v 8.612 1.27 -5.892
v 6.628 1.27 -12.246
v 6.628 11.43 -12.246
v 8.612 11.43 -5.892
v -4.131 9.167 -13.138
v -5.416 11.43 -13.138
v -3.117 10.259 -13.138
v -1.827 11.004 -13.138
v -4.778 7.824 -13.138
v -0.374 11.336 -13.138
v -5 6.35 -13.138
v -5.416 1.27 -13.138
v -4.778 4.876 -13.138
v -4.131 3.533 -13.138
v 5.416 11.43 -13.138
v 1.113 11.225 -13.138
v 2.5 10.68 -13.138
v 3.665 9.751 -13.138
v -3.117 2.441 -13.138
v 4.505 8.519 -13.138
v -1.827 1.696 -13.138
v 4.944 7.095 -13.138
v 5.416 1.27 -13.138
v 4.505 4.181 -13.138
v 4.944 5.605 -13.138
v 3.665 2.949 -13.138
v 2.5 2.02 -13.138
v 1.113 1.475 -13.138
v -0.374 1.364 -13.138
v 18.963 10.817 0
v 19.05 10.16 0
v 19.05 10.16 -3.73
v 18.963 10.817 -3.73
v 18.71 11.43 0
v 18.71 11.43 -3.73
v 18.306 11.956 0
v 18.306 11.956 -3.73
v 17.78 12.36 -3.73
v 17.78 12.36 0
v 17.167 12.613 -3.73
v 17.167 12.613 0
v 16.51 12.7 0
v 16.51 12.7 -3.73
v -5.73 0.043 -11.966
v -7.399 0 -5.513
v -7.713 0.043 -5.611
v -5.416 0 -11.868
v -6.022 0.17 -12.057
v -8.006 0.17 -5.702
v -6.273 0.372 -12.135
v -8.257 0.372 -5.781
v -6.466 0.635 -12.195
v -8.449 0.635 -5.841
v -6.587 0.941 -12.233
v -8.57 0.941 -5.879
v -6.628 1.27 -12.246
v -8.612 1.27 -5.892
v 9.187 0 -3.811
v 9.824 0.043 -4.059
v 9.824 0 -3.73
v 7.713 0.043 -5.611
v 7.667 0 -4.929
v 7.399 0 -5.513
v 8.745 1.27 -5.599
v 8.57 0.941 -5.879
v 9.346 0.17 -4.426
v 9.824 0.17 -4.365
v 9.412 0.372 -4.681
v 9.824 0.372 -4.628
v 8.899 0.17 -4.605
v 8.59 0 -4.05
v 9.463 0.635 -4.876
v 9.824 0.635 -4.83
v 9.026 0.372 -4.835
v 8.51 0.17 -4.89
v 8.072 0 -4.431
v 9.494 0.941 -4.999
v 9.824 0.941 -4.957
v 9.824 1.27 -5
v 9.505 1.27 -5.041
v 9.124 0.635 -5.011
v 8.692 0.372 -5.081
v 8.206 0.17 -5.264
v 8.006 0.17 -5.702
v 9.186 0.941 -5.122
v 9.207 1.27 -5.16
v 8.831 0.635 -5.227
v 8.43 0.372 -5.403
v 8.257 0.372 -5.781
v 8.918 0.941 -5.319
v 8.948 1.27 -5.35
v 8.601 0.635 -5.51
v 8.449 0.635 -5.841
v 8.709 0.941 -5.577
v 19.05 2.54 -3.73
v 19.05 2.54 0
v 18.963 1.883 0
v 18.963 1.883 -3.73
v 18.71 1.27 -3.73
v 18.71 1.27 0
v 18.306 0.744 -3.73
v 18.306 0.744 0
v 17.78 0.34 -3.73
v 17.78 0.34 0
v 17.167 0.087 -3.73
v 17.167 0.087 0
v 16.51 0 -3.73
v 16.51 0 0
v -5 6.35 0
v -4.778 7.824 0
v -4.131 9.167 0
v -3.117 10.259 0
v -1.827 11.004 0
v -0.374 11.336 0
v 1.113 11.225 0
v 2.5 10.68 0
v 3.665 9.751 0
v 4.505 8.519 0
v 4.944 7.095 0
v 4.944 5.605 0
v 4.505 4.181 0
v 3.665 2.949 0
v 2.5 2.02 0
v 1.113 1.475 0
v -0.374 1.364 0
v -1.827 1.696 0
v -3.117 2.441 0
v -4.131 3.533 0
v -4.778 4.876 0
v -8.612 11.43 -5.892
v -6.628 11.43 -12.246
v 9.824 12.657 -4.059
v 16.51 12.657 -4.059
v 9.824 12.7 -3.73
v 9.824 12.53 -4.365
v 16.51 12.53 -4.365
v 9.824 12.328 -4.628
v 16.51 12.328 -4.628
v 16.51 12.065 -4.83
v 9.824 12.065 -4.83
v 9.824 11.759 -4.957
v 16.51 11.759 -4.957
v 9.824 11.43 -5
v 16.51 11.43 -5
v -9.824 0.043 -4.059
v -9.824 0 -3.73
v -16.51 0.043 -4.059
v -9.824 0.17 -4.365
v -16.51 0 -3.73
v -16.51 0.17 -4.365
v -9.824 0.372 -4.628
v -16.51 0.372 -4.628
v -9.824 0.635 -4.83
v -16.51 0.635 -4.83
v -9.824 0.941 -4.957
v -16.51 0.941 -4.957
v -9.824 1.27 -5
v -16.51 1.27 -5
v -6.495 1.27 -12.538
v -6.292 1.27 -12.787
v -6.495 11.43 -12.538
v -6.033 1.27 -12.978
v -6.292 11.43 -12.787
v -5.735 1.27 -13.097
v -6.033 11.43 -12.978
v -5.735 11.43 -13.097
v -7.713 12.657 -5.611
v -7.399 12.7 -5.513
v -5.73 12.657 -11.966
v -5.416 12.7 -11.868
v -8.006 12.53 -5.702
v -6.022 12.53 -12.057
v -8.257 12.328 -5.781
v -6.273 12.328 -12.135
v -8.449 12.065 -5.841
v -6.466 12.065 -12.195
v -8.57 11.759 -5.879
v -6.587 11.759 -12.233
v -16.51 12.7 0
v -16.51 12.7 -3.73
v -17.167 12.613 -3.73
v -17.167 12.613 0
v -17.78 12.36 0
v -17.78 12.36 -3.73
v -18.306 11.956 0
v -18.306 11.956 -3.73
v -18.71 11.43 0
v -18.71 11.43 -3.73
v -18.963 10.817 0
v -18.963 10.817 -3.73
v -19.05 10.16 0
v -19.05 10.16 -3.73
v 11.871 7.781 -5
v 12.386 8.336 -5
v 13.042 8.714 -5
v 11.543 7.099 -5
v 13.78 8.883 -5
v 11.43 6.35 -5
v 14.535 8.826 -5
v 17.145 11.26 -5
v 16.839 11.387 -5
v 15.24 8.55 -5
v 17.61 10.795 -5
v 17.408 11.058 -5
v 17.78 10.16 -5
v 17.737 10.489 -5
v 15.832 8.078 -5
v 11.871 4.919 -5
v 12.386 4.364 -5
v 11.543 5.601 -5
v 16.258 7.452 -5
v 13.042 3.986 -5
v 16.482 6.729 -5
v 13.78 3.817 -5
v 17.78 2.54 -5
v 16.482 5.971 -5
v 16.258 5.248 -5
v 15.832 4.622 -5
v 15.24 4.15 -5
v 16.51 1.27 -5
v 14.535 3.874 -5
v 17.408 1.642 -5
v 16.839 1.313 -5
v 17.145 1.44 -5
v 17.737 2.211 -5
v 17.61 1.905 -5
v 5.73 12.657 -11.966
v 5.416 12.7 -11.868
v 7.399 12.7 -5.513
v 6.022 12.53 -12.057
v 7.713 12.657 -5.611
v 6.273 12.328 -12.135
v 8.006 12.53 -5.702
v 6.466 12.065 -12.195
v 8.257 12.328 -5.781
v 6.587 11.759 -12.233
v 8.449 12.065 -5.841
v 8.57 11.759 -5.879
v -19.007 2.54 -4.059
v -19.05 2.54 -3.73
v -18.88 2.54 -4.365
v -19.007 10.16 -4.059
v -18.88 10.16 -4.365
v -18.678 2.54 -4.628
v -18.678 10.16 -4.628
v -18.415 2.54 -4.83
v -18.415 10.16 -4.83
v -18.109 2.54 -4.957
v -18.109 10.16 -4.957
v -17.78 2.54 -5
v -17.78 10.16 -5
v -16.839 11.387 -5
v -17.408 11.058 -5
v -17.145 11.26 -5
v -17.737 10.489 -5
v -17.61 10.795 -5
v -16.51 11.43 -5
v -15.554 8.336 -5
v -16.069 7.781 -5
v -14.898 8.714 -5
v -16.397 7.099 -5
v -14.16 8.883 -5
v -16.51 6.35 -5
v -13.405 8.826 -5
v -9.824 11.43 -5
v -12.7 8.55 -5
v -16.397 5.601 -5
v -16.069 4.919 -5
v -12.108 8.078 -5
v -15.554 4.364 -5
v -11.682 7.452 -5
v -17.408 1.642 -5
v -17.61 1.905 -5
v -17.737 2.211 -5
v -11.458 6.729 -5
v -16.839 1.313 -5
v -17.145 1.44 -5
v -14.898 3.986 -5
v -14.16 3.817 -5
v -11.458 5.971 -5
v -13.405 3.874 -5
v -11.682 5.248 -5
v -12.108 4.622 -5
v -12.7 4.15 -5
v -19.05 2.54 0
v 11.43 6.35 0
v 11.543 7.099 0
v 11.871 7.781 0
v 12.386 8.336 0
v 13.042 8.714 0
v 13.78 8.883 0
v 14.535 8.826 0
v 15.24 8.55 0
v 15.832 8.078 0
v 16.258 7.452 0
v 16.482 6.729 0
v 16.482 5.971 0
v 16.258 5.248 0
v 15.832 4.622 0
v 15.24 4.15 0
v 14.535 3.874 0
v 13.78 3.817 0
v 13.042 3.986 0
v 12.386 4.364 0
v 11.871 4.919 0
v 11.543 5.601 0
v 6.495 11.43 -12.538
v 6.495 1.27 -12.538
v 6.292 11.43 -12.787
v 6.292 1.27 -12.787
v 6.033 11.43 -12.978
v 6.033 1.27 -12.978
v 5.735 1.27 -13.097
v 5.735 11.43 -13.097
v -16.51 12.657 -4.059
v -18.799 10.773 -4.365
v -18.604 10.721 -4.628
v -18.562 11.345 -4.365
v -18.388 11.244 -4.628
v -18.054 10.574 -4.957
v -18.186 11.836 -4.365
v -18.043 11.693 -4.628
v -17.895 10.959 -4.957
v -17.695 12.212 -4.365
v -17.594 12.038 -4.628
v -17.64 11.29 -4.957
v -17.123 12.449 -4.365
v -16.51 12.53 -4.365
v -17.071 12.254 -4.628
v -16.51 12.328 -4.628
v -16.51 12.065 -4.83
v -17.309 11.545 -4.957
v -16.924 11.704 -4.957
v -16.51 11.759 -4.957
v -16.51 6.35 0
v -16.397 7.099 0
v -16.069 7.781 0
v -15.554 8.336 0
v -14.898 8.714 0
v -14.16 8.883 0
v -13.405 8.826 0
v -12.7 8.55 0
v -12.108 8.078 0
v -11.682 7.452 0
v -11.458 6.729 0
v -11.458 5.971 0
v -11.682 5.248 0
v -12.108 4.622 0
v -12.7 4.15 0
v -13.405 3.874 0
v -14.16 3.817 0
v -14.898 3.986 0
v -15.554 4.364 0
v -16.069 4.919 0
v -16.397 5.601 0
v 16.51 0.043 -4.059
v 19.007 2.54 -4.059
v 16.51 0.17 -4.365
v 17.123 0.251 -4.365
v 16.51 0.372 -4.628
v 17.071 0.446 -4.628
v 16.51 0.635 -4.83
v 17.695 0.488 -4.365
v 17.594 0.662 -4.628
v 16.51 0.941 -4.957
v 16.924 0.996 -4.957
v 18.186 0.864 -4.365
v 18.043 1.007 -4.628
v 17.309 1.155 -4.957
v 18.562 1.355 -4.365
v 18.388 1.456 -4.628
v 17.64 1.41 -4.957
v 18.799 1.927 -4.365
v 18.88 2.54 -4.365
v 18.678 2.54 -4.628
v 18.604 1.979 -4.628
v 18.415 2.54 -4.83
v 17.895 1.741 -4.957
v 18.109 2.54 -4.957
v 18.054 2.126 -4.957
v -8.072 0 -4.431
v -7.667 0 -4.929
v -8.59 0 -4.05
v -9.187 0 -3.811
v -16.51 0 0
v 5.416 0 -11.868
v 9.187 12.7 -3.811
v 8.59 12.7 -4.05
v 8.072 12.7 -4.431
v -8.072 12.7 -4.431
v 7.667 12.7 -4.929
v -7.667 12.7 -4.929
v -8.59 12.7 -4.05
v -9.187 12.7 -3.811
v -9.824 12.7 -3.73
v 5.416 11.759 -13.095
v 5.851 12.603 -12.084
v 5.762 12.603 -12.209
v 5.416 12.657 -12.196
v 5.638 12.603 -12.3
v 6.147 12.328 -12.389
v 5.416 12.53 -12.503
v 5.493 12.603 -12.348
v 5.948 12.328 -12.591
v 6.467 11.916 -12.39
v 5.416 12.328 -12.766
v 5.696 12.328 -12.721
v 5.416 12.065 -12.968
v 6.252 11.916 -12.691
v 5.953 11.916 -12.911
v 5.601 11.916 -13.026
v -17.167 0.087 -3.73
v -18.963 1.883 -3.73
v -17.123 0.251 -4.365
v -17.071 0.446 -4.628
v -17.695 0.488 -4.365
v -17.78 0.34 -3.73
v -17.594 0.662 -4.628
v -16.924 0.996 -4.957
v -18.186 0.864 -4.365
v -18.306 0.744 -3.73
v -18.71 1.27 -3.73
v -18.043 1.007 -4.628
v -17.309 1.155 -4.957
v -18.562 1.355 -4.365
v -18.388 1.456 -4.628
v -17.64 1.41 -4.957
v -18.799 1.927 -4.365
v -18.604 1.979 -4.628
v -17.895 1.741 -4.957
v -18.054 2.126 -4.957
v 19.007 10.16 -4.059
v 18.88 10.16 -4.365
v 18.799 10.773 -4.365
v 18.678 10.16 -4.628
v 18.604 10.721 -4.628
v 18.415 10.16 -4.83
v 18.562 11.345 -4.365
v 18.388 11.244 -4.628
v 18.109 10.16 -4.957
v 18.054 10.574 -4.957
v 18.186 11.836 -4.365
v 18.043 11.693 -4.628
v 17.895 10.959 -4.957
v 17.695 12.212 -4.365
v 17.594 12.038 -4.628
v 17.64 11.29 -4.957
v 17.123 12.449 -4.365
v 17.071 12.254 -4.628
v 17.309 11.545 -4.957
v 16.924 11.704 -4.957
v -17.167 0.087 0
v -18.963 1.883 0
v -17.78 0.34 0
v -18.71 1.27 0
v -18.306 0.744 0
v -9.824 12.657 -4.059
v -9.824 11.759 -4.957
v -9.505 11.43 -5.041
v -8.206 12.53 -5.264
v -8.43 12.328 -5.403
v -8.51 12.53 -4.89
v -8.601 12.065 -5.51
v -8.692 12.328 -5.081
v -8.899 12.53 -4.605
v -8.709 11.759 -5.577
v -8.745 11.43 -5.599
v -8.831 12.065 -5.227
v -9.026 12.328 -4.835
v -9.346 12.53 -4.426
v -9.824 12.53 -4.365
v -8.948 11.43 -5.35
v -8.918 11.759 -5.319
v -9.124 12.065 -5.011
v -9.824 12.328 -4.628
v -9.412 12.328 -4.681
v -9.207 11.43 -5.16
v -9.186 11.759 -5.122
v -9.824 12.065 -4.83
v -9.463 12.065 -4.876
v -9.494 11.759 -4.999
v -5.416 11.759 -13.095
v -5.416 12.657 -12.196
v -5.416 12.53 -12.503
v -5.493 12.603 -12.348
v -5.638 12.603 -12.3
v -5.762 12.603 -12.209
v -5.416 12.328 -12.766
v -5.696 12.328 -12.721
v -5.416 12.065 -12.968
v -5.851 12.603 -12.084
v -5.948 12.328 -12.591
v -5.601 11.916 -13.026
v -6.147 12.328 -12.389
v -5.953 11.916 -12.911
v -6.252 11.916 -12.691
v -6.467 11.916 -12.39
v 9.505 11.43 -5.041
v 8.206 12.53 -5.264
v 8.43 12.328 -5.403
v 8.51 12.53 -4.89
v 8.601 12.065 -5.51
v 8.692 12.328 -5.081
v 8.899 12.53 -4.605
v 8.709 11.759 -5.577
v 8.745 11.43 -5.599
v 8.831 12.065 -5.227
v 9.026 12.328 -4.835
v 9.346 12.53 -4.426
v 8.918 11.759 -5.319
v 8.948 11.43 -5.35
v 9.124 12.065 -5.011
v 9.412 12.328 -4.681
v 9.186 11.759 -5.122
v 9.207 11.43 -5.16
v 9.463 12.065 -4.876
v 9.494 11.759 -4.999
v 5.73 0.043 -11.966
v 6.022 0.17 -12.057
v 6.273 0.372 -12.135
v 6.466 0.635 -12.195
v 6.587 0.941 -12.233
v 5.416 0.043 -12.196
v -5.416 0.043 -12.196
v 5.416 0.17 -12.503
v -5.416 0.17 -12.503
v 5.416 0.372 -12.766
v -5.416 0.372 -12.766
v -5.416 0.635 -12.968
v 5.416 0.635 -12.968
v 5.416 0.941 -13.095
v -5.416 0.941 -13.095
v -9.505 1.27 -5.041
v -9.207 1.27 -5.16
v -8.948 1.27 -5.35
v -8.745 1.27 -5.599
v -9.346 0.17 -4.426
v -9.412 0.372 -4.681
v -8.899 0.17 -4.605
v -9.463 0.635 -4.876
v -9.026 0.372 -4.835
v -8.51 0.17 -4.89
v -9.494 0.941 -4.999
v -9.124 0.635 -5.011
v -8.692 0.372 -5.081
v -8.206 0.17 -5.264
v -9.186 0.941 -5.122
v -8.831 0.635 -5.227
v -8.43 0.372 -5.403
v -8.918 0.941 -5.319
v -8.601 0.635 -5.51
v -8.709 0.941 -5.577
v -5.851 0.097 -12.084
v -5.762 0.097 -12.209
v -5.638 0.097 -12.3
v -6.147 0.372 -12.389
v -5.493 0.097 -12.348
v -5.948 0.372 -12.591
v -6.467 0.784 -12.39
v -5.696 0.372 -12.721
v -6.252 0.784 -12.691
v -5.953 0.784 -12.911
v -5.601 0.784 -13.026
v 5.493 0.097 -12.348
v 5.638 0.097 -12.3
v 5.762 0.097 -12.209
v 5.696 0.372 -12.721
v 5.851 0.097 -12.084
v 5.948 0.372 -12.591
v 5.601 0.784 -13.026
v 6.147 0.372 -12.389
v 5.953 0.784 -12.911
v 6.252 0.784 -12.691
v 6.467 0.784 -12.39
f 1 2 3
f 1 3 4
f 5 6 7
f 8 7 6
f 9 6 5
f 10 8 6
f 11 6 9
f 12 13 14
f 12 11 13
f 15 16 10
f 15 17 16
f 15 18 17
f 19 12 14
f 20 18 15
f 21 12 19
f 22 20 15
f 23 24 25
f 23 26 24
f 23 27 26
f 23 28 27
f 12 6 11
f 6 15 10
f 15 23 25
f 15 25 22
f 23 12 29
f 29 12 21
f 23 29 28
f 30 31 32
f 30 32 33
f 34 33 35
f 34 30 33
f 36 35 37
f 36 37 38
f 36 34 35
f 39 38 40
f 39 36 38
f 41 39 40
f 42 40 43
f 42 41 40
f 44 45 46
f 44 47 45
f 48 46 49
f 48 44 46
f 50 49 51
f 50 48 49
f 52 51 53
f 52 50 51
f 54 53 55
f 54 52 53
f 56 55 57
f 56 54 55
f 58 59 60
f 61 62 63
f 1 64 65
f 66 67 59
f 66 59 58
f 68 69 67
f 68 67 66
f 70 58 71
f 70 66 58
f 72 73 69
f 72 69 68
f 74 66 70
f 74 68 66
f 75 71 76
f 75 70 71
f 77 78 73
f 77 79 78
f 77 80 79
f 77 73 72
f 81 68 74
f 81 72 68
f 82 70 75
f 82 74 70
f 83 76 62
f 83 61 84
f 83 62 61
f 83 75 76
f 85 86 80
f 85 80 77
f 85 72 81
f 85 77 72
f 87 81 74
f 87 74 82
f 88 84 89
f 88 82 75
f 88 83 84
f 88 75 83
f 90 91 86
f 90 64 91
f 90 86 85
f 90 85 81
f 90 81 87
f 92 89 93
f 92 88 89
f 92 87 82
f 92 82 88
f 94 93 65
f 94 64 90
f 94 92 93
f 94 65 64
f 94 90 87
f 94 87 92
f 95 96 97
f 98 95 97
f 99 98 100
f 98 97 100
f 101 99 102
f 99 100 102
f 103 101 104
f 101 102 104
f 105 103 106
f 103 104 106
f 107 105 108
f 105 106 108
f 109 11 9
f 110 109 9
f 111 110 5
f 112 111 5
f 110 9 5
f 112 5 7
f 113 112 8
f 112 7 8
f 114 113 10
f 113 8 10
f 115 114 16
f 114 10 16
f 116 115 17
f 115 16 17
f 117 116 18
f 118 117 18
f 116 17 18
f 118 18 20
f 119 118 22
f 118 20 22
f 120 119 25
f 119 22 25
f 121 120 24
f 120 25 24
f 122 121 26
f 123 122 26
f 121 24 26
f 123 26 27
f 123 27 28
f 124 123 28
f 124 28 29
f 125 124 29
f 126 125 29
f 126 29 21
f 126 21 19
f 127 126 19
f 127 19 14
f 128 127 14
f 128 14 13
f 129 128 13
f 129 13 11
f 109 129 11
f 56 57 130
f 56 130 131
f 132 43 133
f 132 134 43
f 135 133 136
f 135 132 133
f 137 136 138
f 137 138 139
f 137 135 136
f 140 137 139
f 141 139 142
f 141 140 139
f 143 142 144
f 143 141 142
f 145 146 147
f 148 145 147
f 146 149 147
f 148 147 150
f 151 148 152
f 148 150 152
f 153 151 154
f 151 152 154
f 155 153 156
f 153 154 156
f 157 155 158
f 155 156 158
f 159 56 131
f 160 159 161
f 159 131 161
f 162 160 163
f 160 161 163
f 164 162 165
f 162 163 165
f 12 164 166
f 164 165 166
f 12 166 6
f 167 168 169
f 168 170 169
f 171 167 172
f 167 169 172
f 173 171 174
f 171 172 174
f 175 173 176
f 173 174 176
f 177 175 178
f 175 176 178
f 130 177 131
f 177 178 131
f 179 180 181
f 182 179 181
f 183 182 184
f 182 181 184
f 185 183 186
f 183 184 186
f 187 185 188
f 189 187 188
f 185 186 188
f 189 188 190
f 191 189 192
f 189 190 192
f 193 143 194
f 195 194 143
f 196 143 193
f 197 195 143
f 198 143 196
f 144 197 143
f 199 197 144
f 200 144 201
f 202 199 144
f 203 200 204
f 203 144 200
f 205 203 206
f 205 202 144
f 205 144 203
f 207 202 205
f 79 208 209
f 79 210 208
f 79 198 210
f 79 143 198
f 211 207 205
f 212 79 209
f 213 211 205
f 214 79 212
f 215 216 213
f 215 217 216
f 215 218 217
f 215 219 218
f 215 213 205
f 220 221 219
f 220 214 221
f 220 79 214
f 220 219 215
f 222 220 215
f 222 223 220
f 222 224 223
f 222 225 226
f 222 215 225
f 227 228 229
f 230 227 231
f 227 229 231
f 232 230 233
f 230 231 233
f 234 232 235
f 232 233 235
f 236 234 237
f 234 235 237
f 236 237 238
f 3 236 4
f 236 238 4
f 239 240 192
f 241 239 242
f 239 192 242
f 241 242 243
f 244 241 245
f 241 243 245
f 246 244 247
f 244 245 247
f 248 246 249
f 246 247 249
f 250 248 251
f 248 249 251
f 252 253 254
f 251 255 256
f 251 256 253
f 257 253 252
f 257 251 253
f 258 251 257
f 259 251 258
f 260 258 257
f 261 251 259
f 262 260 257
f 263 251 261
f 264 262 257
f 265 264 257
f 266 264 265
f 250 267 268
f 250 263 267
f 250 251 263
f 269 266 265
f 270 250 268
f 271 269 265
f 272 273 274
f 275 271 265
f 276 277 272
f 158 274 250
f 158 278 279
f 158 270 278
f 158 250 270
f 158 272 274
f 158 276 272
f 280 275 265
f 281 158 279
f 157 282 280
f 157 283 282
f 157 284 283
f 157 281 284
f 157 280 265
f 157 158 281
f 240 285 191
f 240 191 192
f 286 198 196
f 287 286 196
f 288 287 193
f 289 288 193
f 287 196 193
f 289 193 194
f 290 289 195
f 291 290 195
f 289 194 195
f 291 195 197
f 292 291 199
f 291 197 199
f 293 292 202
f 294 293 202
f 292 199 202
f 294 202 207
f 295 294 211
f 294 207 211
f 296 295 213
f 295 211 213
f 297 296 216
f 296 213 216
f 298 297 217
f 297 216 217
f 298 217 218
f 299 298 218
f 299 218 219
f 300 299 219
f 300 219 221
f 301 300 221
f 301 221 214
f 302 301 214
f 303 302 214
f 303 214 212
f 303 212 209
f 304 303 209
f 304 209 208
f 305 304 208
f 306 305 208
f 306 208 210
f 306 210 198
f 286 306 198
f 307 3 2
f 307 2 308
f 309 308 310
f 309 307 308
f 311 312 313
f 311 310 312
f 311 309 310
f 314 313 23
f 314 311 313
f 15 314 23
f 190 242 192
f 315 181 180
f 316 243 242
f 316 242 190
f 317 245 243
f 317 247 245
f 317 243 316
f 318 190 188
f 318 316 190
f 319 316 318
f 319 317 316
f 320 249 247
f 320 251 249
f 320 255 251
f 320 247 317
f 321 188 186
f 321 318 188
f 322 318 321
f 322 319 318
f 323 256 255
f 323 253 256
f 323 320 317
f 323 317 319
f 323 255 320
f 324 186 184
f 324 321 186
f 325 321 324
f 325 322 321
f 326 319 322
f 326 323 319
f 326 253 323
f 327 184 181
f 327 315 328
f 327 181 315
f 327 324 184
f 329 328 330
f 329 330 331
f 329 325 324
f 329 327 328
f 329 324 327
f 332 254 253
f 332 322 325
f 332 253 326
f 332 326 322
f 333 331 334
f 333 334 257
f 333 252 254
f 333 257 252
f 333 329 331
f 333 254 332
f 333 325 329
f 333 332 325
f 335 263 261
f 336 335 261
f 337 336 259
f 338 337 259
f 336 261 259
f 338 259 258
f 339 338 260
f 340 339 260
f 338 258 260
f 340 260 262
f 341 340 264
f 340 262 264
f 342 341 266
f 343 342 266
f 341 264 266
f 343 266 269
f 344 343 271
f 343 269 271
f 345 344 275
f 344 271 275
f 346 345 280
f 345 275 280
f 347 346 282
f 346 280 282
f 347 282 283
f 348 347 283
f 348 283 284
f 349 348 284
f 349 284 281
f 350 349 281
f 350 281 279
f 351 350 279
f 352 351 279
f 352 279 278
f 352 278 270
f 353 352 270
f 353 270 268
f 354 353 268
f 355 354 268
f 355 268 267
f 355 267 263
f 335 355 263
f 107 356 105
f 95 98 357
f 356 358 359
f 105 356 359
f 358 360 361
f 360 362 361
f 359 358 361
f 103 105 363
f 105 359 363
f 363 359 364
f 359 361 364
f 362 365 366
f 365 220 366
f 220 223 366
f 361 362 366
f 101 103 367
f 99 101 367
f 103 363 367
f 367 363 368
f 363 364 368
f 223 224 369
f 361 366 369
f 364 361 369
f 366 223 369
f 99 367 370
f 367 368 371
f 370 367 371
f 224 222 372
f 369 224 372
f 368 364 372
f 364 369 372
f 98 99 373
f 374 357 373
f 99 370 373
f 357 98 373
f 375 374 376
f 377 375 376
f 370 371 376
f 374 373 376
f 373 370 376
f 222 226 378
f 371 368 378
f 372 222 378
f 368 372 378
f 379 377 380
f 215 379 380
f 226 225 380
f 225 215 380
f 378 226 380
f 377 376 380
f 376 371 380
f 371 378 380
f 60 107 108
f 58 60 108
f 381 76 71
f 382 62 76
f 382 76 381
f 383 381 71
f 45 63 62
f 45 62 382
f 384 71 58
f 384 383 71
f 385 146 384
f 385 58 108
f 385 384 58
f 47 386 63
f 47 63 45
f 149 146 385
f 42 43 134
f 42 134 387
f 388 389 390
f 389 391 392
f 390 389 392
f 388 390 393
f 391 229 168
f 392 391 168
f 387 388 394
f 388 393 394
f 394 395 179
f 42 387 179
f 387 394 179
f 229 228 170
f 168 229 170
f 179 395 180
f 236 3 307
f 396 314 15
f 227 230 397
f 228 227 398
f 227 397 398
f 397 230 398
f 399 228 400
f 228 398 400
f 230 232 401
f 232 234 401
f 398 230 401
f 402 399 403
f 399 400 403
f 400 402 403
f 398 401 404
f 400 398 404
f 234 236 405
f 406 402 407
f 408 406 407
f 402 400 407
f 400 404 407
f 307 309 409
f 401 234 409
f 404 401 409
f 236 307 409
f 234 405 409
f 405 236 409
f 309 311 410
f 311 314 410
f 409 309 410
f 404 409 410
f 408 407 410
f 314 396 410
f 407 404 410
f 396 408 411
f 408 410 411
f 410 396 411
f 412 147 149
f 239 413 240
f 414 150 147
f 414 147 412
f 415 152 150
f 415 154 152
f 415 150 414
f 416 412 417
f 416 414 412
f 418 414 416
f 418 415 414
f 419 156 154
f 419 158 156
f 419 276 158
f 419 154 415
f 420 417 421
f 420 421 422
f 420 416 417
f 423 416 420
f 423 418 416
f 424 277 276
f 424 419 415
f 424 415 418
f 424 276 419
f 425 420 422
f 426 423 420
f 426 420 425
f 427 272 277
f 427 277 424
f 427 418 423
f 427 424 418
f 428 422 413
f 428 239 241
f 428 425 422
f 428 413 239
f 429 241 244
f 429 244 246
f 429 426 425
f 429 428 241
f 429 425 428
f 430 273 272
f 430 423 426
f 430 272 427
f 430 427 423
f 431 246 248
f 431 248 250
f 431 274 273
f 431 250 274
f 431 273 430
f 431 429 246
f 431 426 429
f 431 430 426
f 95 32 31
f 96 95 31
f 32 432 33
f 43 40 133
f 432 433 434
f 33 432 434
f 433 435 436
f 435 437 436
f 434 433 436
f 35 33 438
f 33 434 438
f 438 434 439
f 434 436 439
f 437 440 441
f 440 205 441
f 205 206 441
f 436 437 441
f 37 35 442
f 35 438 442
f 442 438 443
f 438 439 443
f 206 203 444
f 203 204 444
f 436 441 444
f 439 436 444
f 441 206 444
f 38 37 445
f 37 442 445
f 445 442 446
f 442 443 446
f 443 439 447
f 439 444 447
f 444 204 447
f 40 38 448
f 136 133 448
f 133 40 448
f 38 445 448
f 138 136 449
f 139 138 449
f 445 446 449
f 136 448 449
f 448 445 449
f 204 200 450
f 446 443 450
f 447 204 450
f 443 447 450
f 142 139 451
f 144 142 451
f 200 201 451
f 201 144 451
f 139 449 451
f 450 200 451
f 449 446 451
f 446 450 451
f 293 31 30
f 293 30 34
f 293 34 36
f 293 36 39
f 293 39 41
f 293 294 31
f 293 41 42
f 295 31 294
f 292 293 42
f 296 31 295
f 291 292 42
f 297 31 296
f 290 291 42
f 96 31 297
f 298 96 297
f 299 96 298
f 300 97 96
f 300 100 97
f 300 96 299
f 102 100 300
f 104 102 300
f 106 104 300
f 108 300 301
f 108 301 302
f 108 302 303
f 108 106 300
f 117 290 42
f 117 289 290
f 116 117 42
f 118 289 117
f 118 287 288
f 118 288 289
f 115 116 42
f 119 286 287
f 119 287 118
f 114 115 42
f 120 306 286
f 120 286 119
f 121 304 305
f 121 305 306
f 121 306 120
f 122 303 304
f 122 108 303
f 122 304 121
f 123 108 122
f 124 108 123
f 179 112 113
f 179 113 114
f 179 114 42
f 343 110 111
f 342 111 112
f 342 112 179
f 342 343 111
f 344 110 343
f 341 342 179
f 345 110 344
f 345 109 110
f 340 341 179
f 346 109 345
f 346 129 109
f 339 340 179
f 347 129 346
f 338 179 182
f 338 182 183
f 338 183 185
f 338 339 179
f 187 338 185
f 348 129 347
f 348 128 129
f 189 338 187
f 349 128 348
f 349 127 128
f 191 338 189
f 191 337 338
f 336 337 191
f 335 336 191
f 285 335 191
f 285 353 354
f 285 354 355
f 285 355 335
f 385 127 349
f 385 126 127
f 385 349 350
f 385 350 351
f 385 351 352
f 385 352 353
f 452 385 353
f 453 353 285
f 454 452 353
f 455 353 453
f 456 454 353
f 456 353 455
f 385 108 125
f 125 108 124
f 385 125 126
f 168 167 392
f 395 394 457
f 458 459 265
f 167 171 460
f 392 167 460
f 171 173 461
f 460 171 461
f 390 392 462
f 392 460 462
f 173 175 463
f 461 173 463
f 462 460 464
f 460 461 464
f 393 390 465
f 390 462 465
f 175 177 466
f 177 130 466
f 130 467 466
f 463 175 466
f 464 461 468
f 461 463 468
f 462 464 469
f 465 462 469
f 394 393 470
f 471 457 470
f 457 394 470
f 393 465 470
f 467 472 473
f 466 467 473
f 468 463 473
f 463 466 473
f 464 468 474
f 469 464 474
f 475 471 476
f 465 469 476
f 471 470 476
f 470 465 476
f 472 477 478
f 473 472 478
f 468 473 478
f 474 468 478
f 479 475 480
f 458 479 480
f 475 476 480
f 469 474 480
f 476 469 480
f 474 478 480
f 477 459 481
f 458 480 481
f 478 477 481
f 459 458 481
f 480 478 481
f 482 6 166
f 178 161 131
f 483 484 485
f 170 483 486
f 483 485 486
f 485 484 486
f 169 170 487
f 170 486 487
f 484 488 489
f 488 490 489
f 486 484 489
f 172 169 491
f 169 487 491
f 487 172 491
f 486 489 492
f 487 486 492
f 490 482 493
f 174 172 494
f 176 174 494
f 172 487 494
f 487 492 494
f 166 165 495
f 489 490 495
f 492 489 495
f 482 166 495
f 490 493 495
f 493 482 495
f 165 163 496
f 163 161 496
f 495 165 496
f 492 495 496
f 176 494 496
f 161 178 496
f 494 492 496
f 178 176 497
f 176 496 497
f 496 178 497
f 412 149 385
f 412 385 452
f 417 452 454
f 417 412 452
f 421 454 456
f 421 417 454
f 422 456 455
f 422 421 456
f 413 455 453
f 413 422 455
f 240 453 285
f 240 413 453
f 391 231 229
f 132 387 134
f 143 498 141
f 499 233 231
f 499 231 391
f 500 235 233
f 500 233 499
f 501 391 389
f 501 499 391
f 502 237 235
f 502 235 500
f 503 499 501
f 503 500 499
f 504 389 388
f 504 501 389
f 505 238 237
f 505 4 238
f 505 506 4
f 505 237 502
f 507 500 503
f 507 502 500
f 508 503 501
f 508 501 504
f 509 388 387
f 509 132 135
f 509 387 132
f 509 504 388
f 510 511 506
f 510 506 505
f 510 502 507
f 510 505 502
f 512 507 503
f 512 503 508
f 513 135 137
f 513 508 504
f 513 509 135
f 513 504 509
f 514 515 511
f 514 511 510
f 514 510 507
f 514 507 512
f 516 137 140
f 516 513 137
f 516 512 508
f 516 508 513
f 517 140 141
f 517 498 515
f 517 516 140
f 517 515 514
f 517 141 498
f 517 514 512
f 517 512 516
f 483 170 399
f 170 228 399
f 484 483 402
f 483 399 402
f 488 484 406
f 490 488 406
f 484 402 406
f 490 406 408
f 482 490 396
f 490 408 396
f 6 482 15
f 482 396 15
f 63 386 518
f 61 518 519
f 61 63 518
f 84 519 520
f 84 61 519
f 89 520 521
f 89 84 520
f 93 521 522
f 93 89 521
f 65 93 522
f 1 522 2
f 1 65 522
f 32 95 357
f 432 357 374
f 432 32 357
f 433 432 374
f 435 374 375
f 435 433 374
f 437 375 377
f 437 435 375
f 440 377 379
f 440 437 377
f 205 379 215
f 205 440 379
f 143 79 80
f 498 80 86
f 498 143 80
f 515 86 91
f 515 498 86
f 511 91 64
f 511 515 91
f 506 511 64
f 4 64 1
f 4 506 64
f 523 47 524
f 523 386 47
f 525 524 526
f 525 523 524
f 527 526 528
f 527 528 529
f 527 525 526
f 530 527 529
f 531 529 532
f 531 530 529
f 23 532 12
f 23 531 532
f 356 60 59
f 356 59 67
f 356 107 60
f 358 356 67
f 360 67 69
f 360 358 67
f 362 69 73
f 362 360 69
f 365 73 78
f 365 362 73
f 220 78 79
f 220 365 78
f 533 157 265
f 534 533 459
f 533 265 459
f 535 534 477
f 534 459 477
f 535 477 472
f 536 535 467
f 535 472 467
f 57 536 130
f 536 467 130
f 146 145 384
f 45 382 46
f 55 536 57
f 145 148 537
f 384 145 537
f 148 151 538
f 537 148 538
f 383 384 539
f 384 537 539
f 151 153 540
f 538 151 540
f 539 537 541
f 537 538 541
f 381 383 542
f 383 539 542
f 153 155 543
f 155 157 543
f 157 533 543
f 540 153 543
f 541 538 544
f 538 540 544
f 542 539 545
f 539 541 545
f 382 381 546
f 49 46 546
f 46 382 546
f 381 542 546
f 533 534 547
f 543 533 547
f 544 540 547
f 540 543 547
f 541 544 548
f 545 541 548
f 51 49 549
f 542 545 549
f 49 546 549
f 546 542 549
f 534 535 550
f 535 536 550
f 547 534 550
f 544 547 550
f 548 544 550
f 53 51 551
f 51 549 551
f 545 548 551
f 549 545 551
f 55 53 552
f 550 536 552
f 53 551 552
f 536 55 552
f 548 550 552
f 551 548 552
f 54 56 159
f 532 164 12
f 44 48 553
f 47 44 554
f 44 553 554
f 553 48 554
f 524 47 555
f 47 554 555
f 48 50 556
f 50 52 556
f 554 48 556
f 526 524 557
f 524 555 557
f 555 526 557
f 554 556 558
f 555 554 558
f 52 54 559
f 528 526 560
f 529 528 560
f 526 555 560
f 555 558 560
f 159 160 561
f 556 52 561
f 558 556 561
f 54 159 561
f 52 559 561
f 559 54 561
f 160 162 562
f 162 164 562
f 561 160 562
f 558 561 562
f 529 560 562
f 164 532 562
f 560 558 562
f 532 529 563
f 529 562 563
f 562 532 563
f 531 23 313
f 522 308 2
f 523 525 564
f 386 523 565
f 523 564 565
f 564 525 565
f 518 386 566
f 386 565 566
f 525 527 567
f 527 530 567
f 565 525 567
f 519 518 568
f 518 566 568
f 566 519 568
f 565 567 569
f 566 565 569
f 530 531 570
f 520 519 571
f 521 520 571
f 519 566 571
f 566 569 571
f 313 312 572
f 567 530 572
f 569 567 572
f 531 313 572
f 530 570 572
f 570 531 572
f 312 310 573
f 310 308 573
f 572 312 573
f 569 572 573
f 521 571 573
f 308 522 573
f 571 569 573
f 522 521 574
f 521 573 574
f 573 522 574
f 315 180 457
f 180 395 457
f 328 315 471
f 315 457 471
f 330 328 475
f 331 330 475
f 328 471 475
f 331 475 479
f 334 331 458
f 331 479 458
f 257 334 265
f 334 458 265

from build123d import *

# Parameters (mm, degrees)
BOSS_EXTRUDE1_DEPTH = 12.7
SKETCH2_R           = 5
CUT_EXTRUDE1_DEPTH  = 14.137790614
SKETCH3_R           = 2.54
CUT_EXTRUDE2_DEPTH  = 6
FILLET1_R           = 2.54
FILLET2_R           = 1.27


with BuildPart() as part:
    # Sketch1 → Boss-Extrude1 (new body)
    with BuildSketch(Plane(origin=(0, 0, 0), x_dir=(1, 0, 0), z_dir=(0, 1, 0))):
        Polygon((19.05, 0), (-19.05, 0), (-19.05, 5), (-8.89, 5), (-6.35, 13.137790614), (6.35, 13.137790614), (8.89, 5), (19.05, 5), align=None)
    extrude(amount=BOSS_EXTRUDE1_DEPTH)

    # Sketch2 → Cut-Extrude1 (cut, through all)
    with BuildSketch(Plane(origin=(0, 0, -13.137790614), x_dir=(-1, 0, 0), z_dir=(0, 0, -1))):
        with Locations((0, 6.35)):
            Circle(SKETCH2_R)
    extrude(amount=-CUT_EXTRUDE1_DEPTH, mode=Mode.SUBTRACT)

    # Sketch3 → Cut-Extrude2 (cut, through all)
    with BuildSketch(Plane(origin=(0, 0, -5), x_dir=(-1, 0, 0), z_dir=(0, 0, -1))):
        with Locations((13.97, 6.35)):
            Circle(SKETCH3_R)
        with Locations((-13.97, 6.35)):
            Circle(SKETCH3_R)
    extrude(amount=-CUT_EXTRUDE2_DEPTH, mode=Mode.SUBTRACT)

    # Fillet1
    fillet1_edges = [part.edges().sort_by_distance(p)[0] for p in [
        (19.05, 12.7, -2.5),
        (-19.05, 0, -2.5),
        (-19.05, 12.7, -2.5),
        (19.05, 0, -2.5),
    ]]
    fillet(fillet1_edges, radius=FILLET1_R)

    # Fillet2
    fillet2_edges = [part.edges().sort_by_distance(p)[0] for p in [
        (-8.89, 6.35, -5),
        (-6.35, 6.35, -13.137790614),
        (6.35, 6.35, -13.137790614),
        (8.89, 6.35, -5),
        (7.62, 12.7, -9.068895307),
        (0, 12.7, -13.137790614),
        (-7.62, 12.7, -9.068895307),
        (-12.7, 12.7, -5),
        (-19.05, 6.35, -5),
        (12.7, 0, -5),
        (-18.306051224, 11.956051224, -5),
        (-18.306051224, 0.743948776, -5),
        (19.05, 6.35, -5),
        (12.7, 12.7, -5),
        (18.306051224, 11.956051224, -5),
        (18.306051224, 0.743948776, -5),
        (-12.7, 0, -5),
        (-7.62, 0, -9.068895307),
        (0, 0, -13.137790614),
        (7.62, 0, -9.068895307),
    ]]
    fillet(fillet2_edges, radius=FILLET2_R)


solid = part.part
